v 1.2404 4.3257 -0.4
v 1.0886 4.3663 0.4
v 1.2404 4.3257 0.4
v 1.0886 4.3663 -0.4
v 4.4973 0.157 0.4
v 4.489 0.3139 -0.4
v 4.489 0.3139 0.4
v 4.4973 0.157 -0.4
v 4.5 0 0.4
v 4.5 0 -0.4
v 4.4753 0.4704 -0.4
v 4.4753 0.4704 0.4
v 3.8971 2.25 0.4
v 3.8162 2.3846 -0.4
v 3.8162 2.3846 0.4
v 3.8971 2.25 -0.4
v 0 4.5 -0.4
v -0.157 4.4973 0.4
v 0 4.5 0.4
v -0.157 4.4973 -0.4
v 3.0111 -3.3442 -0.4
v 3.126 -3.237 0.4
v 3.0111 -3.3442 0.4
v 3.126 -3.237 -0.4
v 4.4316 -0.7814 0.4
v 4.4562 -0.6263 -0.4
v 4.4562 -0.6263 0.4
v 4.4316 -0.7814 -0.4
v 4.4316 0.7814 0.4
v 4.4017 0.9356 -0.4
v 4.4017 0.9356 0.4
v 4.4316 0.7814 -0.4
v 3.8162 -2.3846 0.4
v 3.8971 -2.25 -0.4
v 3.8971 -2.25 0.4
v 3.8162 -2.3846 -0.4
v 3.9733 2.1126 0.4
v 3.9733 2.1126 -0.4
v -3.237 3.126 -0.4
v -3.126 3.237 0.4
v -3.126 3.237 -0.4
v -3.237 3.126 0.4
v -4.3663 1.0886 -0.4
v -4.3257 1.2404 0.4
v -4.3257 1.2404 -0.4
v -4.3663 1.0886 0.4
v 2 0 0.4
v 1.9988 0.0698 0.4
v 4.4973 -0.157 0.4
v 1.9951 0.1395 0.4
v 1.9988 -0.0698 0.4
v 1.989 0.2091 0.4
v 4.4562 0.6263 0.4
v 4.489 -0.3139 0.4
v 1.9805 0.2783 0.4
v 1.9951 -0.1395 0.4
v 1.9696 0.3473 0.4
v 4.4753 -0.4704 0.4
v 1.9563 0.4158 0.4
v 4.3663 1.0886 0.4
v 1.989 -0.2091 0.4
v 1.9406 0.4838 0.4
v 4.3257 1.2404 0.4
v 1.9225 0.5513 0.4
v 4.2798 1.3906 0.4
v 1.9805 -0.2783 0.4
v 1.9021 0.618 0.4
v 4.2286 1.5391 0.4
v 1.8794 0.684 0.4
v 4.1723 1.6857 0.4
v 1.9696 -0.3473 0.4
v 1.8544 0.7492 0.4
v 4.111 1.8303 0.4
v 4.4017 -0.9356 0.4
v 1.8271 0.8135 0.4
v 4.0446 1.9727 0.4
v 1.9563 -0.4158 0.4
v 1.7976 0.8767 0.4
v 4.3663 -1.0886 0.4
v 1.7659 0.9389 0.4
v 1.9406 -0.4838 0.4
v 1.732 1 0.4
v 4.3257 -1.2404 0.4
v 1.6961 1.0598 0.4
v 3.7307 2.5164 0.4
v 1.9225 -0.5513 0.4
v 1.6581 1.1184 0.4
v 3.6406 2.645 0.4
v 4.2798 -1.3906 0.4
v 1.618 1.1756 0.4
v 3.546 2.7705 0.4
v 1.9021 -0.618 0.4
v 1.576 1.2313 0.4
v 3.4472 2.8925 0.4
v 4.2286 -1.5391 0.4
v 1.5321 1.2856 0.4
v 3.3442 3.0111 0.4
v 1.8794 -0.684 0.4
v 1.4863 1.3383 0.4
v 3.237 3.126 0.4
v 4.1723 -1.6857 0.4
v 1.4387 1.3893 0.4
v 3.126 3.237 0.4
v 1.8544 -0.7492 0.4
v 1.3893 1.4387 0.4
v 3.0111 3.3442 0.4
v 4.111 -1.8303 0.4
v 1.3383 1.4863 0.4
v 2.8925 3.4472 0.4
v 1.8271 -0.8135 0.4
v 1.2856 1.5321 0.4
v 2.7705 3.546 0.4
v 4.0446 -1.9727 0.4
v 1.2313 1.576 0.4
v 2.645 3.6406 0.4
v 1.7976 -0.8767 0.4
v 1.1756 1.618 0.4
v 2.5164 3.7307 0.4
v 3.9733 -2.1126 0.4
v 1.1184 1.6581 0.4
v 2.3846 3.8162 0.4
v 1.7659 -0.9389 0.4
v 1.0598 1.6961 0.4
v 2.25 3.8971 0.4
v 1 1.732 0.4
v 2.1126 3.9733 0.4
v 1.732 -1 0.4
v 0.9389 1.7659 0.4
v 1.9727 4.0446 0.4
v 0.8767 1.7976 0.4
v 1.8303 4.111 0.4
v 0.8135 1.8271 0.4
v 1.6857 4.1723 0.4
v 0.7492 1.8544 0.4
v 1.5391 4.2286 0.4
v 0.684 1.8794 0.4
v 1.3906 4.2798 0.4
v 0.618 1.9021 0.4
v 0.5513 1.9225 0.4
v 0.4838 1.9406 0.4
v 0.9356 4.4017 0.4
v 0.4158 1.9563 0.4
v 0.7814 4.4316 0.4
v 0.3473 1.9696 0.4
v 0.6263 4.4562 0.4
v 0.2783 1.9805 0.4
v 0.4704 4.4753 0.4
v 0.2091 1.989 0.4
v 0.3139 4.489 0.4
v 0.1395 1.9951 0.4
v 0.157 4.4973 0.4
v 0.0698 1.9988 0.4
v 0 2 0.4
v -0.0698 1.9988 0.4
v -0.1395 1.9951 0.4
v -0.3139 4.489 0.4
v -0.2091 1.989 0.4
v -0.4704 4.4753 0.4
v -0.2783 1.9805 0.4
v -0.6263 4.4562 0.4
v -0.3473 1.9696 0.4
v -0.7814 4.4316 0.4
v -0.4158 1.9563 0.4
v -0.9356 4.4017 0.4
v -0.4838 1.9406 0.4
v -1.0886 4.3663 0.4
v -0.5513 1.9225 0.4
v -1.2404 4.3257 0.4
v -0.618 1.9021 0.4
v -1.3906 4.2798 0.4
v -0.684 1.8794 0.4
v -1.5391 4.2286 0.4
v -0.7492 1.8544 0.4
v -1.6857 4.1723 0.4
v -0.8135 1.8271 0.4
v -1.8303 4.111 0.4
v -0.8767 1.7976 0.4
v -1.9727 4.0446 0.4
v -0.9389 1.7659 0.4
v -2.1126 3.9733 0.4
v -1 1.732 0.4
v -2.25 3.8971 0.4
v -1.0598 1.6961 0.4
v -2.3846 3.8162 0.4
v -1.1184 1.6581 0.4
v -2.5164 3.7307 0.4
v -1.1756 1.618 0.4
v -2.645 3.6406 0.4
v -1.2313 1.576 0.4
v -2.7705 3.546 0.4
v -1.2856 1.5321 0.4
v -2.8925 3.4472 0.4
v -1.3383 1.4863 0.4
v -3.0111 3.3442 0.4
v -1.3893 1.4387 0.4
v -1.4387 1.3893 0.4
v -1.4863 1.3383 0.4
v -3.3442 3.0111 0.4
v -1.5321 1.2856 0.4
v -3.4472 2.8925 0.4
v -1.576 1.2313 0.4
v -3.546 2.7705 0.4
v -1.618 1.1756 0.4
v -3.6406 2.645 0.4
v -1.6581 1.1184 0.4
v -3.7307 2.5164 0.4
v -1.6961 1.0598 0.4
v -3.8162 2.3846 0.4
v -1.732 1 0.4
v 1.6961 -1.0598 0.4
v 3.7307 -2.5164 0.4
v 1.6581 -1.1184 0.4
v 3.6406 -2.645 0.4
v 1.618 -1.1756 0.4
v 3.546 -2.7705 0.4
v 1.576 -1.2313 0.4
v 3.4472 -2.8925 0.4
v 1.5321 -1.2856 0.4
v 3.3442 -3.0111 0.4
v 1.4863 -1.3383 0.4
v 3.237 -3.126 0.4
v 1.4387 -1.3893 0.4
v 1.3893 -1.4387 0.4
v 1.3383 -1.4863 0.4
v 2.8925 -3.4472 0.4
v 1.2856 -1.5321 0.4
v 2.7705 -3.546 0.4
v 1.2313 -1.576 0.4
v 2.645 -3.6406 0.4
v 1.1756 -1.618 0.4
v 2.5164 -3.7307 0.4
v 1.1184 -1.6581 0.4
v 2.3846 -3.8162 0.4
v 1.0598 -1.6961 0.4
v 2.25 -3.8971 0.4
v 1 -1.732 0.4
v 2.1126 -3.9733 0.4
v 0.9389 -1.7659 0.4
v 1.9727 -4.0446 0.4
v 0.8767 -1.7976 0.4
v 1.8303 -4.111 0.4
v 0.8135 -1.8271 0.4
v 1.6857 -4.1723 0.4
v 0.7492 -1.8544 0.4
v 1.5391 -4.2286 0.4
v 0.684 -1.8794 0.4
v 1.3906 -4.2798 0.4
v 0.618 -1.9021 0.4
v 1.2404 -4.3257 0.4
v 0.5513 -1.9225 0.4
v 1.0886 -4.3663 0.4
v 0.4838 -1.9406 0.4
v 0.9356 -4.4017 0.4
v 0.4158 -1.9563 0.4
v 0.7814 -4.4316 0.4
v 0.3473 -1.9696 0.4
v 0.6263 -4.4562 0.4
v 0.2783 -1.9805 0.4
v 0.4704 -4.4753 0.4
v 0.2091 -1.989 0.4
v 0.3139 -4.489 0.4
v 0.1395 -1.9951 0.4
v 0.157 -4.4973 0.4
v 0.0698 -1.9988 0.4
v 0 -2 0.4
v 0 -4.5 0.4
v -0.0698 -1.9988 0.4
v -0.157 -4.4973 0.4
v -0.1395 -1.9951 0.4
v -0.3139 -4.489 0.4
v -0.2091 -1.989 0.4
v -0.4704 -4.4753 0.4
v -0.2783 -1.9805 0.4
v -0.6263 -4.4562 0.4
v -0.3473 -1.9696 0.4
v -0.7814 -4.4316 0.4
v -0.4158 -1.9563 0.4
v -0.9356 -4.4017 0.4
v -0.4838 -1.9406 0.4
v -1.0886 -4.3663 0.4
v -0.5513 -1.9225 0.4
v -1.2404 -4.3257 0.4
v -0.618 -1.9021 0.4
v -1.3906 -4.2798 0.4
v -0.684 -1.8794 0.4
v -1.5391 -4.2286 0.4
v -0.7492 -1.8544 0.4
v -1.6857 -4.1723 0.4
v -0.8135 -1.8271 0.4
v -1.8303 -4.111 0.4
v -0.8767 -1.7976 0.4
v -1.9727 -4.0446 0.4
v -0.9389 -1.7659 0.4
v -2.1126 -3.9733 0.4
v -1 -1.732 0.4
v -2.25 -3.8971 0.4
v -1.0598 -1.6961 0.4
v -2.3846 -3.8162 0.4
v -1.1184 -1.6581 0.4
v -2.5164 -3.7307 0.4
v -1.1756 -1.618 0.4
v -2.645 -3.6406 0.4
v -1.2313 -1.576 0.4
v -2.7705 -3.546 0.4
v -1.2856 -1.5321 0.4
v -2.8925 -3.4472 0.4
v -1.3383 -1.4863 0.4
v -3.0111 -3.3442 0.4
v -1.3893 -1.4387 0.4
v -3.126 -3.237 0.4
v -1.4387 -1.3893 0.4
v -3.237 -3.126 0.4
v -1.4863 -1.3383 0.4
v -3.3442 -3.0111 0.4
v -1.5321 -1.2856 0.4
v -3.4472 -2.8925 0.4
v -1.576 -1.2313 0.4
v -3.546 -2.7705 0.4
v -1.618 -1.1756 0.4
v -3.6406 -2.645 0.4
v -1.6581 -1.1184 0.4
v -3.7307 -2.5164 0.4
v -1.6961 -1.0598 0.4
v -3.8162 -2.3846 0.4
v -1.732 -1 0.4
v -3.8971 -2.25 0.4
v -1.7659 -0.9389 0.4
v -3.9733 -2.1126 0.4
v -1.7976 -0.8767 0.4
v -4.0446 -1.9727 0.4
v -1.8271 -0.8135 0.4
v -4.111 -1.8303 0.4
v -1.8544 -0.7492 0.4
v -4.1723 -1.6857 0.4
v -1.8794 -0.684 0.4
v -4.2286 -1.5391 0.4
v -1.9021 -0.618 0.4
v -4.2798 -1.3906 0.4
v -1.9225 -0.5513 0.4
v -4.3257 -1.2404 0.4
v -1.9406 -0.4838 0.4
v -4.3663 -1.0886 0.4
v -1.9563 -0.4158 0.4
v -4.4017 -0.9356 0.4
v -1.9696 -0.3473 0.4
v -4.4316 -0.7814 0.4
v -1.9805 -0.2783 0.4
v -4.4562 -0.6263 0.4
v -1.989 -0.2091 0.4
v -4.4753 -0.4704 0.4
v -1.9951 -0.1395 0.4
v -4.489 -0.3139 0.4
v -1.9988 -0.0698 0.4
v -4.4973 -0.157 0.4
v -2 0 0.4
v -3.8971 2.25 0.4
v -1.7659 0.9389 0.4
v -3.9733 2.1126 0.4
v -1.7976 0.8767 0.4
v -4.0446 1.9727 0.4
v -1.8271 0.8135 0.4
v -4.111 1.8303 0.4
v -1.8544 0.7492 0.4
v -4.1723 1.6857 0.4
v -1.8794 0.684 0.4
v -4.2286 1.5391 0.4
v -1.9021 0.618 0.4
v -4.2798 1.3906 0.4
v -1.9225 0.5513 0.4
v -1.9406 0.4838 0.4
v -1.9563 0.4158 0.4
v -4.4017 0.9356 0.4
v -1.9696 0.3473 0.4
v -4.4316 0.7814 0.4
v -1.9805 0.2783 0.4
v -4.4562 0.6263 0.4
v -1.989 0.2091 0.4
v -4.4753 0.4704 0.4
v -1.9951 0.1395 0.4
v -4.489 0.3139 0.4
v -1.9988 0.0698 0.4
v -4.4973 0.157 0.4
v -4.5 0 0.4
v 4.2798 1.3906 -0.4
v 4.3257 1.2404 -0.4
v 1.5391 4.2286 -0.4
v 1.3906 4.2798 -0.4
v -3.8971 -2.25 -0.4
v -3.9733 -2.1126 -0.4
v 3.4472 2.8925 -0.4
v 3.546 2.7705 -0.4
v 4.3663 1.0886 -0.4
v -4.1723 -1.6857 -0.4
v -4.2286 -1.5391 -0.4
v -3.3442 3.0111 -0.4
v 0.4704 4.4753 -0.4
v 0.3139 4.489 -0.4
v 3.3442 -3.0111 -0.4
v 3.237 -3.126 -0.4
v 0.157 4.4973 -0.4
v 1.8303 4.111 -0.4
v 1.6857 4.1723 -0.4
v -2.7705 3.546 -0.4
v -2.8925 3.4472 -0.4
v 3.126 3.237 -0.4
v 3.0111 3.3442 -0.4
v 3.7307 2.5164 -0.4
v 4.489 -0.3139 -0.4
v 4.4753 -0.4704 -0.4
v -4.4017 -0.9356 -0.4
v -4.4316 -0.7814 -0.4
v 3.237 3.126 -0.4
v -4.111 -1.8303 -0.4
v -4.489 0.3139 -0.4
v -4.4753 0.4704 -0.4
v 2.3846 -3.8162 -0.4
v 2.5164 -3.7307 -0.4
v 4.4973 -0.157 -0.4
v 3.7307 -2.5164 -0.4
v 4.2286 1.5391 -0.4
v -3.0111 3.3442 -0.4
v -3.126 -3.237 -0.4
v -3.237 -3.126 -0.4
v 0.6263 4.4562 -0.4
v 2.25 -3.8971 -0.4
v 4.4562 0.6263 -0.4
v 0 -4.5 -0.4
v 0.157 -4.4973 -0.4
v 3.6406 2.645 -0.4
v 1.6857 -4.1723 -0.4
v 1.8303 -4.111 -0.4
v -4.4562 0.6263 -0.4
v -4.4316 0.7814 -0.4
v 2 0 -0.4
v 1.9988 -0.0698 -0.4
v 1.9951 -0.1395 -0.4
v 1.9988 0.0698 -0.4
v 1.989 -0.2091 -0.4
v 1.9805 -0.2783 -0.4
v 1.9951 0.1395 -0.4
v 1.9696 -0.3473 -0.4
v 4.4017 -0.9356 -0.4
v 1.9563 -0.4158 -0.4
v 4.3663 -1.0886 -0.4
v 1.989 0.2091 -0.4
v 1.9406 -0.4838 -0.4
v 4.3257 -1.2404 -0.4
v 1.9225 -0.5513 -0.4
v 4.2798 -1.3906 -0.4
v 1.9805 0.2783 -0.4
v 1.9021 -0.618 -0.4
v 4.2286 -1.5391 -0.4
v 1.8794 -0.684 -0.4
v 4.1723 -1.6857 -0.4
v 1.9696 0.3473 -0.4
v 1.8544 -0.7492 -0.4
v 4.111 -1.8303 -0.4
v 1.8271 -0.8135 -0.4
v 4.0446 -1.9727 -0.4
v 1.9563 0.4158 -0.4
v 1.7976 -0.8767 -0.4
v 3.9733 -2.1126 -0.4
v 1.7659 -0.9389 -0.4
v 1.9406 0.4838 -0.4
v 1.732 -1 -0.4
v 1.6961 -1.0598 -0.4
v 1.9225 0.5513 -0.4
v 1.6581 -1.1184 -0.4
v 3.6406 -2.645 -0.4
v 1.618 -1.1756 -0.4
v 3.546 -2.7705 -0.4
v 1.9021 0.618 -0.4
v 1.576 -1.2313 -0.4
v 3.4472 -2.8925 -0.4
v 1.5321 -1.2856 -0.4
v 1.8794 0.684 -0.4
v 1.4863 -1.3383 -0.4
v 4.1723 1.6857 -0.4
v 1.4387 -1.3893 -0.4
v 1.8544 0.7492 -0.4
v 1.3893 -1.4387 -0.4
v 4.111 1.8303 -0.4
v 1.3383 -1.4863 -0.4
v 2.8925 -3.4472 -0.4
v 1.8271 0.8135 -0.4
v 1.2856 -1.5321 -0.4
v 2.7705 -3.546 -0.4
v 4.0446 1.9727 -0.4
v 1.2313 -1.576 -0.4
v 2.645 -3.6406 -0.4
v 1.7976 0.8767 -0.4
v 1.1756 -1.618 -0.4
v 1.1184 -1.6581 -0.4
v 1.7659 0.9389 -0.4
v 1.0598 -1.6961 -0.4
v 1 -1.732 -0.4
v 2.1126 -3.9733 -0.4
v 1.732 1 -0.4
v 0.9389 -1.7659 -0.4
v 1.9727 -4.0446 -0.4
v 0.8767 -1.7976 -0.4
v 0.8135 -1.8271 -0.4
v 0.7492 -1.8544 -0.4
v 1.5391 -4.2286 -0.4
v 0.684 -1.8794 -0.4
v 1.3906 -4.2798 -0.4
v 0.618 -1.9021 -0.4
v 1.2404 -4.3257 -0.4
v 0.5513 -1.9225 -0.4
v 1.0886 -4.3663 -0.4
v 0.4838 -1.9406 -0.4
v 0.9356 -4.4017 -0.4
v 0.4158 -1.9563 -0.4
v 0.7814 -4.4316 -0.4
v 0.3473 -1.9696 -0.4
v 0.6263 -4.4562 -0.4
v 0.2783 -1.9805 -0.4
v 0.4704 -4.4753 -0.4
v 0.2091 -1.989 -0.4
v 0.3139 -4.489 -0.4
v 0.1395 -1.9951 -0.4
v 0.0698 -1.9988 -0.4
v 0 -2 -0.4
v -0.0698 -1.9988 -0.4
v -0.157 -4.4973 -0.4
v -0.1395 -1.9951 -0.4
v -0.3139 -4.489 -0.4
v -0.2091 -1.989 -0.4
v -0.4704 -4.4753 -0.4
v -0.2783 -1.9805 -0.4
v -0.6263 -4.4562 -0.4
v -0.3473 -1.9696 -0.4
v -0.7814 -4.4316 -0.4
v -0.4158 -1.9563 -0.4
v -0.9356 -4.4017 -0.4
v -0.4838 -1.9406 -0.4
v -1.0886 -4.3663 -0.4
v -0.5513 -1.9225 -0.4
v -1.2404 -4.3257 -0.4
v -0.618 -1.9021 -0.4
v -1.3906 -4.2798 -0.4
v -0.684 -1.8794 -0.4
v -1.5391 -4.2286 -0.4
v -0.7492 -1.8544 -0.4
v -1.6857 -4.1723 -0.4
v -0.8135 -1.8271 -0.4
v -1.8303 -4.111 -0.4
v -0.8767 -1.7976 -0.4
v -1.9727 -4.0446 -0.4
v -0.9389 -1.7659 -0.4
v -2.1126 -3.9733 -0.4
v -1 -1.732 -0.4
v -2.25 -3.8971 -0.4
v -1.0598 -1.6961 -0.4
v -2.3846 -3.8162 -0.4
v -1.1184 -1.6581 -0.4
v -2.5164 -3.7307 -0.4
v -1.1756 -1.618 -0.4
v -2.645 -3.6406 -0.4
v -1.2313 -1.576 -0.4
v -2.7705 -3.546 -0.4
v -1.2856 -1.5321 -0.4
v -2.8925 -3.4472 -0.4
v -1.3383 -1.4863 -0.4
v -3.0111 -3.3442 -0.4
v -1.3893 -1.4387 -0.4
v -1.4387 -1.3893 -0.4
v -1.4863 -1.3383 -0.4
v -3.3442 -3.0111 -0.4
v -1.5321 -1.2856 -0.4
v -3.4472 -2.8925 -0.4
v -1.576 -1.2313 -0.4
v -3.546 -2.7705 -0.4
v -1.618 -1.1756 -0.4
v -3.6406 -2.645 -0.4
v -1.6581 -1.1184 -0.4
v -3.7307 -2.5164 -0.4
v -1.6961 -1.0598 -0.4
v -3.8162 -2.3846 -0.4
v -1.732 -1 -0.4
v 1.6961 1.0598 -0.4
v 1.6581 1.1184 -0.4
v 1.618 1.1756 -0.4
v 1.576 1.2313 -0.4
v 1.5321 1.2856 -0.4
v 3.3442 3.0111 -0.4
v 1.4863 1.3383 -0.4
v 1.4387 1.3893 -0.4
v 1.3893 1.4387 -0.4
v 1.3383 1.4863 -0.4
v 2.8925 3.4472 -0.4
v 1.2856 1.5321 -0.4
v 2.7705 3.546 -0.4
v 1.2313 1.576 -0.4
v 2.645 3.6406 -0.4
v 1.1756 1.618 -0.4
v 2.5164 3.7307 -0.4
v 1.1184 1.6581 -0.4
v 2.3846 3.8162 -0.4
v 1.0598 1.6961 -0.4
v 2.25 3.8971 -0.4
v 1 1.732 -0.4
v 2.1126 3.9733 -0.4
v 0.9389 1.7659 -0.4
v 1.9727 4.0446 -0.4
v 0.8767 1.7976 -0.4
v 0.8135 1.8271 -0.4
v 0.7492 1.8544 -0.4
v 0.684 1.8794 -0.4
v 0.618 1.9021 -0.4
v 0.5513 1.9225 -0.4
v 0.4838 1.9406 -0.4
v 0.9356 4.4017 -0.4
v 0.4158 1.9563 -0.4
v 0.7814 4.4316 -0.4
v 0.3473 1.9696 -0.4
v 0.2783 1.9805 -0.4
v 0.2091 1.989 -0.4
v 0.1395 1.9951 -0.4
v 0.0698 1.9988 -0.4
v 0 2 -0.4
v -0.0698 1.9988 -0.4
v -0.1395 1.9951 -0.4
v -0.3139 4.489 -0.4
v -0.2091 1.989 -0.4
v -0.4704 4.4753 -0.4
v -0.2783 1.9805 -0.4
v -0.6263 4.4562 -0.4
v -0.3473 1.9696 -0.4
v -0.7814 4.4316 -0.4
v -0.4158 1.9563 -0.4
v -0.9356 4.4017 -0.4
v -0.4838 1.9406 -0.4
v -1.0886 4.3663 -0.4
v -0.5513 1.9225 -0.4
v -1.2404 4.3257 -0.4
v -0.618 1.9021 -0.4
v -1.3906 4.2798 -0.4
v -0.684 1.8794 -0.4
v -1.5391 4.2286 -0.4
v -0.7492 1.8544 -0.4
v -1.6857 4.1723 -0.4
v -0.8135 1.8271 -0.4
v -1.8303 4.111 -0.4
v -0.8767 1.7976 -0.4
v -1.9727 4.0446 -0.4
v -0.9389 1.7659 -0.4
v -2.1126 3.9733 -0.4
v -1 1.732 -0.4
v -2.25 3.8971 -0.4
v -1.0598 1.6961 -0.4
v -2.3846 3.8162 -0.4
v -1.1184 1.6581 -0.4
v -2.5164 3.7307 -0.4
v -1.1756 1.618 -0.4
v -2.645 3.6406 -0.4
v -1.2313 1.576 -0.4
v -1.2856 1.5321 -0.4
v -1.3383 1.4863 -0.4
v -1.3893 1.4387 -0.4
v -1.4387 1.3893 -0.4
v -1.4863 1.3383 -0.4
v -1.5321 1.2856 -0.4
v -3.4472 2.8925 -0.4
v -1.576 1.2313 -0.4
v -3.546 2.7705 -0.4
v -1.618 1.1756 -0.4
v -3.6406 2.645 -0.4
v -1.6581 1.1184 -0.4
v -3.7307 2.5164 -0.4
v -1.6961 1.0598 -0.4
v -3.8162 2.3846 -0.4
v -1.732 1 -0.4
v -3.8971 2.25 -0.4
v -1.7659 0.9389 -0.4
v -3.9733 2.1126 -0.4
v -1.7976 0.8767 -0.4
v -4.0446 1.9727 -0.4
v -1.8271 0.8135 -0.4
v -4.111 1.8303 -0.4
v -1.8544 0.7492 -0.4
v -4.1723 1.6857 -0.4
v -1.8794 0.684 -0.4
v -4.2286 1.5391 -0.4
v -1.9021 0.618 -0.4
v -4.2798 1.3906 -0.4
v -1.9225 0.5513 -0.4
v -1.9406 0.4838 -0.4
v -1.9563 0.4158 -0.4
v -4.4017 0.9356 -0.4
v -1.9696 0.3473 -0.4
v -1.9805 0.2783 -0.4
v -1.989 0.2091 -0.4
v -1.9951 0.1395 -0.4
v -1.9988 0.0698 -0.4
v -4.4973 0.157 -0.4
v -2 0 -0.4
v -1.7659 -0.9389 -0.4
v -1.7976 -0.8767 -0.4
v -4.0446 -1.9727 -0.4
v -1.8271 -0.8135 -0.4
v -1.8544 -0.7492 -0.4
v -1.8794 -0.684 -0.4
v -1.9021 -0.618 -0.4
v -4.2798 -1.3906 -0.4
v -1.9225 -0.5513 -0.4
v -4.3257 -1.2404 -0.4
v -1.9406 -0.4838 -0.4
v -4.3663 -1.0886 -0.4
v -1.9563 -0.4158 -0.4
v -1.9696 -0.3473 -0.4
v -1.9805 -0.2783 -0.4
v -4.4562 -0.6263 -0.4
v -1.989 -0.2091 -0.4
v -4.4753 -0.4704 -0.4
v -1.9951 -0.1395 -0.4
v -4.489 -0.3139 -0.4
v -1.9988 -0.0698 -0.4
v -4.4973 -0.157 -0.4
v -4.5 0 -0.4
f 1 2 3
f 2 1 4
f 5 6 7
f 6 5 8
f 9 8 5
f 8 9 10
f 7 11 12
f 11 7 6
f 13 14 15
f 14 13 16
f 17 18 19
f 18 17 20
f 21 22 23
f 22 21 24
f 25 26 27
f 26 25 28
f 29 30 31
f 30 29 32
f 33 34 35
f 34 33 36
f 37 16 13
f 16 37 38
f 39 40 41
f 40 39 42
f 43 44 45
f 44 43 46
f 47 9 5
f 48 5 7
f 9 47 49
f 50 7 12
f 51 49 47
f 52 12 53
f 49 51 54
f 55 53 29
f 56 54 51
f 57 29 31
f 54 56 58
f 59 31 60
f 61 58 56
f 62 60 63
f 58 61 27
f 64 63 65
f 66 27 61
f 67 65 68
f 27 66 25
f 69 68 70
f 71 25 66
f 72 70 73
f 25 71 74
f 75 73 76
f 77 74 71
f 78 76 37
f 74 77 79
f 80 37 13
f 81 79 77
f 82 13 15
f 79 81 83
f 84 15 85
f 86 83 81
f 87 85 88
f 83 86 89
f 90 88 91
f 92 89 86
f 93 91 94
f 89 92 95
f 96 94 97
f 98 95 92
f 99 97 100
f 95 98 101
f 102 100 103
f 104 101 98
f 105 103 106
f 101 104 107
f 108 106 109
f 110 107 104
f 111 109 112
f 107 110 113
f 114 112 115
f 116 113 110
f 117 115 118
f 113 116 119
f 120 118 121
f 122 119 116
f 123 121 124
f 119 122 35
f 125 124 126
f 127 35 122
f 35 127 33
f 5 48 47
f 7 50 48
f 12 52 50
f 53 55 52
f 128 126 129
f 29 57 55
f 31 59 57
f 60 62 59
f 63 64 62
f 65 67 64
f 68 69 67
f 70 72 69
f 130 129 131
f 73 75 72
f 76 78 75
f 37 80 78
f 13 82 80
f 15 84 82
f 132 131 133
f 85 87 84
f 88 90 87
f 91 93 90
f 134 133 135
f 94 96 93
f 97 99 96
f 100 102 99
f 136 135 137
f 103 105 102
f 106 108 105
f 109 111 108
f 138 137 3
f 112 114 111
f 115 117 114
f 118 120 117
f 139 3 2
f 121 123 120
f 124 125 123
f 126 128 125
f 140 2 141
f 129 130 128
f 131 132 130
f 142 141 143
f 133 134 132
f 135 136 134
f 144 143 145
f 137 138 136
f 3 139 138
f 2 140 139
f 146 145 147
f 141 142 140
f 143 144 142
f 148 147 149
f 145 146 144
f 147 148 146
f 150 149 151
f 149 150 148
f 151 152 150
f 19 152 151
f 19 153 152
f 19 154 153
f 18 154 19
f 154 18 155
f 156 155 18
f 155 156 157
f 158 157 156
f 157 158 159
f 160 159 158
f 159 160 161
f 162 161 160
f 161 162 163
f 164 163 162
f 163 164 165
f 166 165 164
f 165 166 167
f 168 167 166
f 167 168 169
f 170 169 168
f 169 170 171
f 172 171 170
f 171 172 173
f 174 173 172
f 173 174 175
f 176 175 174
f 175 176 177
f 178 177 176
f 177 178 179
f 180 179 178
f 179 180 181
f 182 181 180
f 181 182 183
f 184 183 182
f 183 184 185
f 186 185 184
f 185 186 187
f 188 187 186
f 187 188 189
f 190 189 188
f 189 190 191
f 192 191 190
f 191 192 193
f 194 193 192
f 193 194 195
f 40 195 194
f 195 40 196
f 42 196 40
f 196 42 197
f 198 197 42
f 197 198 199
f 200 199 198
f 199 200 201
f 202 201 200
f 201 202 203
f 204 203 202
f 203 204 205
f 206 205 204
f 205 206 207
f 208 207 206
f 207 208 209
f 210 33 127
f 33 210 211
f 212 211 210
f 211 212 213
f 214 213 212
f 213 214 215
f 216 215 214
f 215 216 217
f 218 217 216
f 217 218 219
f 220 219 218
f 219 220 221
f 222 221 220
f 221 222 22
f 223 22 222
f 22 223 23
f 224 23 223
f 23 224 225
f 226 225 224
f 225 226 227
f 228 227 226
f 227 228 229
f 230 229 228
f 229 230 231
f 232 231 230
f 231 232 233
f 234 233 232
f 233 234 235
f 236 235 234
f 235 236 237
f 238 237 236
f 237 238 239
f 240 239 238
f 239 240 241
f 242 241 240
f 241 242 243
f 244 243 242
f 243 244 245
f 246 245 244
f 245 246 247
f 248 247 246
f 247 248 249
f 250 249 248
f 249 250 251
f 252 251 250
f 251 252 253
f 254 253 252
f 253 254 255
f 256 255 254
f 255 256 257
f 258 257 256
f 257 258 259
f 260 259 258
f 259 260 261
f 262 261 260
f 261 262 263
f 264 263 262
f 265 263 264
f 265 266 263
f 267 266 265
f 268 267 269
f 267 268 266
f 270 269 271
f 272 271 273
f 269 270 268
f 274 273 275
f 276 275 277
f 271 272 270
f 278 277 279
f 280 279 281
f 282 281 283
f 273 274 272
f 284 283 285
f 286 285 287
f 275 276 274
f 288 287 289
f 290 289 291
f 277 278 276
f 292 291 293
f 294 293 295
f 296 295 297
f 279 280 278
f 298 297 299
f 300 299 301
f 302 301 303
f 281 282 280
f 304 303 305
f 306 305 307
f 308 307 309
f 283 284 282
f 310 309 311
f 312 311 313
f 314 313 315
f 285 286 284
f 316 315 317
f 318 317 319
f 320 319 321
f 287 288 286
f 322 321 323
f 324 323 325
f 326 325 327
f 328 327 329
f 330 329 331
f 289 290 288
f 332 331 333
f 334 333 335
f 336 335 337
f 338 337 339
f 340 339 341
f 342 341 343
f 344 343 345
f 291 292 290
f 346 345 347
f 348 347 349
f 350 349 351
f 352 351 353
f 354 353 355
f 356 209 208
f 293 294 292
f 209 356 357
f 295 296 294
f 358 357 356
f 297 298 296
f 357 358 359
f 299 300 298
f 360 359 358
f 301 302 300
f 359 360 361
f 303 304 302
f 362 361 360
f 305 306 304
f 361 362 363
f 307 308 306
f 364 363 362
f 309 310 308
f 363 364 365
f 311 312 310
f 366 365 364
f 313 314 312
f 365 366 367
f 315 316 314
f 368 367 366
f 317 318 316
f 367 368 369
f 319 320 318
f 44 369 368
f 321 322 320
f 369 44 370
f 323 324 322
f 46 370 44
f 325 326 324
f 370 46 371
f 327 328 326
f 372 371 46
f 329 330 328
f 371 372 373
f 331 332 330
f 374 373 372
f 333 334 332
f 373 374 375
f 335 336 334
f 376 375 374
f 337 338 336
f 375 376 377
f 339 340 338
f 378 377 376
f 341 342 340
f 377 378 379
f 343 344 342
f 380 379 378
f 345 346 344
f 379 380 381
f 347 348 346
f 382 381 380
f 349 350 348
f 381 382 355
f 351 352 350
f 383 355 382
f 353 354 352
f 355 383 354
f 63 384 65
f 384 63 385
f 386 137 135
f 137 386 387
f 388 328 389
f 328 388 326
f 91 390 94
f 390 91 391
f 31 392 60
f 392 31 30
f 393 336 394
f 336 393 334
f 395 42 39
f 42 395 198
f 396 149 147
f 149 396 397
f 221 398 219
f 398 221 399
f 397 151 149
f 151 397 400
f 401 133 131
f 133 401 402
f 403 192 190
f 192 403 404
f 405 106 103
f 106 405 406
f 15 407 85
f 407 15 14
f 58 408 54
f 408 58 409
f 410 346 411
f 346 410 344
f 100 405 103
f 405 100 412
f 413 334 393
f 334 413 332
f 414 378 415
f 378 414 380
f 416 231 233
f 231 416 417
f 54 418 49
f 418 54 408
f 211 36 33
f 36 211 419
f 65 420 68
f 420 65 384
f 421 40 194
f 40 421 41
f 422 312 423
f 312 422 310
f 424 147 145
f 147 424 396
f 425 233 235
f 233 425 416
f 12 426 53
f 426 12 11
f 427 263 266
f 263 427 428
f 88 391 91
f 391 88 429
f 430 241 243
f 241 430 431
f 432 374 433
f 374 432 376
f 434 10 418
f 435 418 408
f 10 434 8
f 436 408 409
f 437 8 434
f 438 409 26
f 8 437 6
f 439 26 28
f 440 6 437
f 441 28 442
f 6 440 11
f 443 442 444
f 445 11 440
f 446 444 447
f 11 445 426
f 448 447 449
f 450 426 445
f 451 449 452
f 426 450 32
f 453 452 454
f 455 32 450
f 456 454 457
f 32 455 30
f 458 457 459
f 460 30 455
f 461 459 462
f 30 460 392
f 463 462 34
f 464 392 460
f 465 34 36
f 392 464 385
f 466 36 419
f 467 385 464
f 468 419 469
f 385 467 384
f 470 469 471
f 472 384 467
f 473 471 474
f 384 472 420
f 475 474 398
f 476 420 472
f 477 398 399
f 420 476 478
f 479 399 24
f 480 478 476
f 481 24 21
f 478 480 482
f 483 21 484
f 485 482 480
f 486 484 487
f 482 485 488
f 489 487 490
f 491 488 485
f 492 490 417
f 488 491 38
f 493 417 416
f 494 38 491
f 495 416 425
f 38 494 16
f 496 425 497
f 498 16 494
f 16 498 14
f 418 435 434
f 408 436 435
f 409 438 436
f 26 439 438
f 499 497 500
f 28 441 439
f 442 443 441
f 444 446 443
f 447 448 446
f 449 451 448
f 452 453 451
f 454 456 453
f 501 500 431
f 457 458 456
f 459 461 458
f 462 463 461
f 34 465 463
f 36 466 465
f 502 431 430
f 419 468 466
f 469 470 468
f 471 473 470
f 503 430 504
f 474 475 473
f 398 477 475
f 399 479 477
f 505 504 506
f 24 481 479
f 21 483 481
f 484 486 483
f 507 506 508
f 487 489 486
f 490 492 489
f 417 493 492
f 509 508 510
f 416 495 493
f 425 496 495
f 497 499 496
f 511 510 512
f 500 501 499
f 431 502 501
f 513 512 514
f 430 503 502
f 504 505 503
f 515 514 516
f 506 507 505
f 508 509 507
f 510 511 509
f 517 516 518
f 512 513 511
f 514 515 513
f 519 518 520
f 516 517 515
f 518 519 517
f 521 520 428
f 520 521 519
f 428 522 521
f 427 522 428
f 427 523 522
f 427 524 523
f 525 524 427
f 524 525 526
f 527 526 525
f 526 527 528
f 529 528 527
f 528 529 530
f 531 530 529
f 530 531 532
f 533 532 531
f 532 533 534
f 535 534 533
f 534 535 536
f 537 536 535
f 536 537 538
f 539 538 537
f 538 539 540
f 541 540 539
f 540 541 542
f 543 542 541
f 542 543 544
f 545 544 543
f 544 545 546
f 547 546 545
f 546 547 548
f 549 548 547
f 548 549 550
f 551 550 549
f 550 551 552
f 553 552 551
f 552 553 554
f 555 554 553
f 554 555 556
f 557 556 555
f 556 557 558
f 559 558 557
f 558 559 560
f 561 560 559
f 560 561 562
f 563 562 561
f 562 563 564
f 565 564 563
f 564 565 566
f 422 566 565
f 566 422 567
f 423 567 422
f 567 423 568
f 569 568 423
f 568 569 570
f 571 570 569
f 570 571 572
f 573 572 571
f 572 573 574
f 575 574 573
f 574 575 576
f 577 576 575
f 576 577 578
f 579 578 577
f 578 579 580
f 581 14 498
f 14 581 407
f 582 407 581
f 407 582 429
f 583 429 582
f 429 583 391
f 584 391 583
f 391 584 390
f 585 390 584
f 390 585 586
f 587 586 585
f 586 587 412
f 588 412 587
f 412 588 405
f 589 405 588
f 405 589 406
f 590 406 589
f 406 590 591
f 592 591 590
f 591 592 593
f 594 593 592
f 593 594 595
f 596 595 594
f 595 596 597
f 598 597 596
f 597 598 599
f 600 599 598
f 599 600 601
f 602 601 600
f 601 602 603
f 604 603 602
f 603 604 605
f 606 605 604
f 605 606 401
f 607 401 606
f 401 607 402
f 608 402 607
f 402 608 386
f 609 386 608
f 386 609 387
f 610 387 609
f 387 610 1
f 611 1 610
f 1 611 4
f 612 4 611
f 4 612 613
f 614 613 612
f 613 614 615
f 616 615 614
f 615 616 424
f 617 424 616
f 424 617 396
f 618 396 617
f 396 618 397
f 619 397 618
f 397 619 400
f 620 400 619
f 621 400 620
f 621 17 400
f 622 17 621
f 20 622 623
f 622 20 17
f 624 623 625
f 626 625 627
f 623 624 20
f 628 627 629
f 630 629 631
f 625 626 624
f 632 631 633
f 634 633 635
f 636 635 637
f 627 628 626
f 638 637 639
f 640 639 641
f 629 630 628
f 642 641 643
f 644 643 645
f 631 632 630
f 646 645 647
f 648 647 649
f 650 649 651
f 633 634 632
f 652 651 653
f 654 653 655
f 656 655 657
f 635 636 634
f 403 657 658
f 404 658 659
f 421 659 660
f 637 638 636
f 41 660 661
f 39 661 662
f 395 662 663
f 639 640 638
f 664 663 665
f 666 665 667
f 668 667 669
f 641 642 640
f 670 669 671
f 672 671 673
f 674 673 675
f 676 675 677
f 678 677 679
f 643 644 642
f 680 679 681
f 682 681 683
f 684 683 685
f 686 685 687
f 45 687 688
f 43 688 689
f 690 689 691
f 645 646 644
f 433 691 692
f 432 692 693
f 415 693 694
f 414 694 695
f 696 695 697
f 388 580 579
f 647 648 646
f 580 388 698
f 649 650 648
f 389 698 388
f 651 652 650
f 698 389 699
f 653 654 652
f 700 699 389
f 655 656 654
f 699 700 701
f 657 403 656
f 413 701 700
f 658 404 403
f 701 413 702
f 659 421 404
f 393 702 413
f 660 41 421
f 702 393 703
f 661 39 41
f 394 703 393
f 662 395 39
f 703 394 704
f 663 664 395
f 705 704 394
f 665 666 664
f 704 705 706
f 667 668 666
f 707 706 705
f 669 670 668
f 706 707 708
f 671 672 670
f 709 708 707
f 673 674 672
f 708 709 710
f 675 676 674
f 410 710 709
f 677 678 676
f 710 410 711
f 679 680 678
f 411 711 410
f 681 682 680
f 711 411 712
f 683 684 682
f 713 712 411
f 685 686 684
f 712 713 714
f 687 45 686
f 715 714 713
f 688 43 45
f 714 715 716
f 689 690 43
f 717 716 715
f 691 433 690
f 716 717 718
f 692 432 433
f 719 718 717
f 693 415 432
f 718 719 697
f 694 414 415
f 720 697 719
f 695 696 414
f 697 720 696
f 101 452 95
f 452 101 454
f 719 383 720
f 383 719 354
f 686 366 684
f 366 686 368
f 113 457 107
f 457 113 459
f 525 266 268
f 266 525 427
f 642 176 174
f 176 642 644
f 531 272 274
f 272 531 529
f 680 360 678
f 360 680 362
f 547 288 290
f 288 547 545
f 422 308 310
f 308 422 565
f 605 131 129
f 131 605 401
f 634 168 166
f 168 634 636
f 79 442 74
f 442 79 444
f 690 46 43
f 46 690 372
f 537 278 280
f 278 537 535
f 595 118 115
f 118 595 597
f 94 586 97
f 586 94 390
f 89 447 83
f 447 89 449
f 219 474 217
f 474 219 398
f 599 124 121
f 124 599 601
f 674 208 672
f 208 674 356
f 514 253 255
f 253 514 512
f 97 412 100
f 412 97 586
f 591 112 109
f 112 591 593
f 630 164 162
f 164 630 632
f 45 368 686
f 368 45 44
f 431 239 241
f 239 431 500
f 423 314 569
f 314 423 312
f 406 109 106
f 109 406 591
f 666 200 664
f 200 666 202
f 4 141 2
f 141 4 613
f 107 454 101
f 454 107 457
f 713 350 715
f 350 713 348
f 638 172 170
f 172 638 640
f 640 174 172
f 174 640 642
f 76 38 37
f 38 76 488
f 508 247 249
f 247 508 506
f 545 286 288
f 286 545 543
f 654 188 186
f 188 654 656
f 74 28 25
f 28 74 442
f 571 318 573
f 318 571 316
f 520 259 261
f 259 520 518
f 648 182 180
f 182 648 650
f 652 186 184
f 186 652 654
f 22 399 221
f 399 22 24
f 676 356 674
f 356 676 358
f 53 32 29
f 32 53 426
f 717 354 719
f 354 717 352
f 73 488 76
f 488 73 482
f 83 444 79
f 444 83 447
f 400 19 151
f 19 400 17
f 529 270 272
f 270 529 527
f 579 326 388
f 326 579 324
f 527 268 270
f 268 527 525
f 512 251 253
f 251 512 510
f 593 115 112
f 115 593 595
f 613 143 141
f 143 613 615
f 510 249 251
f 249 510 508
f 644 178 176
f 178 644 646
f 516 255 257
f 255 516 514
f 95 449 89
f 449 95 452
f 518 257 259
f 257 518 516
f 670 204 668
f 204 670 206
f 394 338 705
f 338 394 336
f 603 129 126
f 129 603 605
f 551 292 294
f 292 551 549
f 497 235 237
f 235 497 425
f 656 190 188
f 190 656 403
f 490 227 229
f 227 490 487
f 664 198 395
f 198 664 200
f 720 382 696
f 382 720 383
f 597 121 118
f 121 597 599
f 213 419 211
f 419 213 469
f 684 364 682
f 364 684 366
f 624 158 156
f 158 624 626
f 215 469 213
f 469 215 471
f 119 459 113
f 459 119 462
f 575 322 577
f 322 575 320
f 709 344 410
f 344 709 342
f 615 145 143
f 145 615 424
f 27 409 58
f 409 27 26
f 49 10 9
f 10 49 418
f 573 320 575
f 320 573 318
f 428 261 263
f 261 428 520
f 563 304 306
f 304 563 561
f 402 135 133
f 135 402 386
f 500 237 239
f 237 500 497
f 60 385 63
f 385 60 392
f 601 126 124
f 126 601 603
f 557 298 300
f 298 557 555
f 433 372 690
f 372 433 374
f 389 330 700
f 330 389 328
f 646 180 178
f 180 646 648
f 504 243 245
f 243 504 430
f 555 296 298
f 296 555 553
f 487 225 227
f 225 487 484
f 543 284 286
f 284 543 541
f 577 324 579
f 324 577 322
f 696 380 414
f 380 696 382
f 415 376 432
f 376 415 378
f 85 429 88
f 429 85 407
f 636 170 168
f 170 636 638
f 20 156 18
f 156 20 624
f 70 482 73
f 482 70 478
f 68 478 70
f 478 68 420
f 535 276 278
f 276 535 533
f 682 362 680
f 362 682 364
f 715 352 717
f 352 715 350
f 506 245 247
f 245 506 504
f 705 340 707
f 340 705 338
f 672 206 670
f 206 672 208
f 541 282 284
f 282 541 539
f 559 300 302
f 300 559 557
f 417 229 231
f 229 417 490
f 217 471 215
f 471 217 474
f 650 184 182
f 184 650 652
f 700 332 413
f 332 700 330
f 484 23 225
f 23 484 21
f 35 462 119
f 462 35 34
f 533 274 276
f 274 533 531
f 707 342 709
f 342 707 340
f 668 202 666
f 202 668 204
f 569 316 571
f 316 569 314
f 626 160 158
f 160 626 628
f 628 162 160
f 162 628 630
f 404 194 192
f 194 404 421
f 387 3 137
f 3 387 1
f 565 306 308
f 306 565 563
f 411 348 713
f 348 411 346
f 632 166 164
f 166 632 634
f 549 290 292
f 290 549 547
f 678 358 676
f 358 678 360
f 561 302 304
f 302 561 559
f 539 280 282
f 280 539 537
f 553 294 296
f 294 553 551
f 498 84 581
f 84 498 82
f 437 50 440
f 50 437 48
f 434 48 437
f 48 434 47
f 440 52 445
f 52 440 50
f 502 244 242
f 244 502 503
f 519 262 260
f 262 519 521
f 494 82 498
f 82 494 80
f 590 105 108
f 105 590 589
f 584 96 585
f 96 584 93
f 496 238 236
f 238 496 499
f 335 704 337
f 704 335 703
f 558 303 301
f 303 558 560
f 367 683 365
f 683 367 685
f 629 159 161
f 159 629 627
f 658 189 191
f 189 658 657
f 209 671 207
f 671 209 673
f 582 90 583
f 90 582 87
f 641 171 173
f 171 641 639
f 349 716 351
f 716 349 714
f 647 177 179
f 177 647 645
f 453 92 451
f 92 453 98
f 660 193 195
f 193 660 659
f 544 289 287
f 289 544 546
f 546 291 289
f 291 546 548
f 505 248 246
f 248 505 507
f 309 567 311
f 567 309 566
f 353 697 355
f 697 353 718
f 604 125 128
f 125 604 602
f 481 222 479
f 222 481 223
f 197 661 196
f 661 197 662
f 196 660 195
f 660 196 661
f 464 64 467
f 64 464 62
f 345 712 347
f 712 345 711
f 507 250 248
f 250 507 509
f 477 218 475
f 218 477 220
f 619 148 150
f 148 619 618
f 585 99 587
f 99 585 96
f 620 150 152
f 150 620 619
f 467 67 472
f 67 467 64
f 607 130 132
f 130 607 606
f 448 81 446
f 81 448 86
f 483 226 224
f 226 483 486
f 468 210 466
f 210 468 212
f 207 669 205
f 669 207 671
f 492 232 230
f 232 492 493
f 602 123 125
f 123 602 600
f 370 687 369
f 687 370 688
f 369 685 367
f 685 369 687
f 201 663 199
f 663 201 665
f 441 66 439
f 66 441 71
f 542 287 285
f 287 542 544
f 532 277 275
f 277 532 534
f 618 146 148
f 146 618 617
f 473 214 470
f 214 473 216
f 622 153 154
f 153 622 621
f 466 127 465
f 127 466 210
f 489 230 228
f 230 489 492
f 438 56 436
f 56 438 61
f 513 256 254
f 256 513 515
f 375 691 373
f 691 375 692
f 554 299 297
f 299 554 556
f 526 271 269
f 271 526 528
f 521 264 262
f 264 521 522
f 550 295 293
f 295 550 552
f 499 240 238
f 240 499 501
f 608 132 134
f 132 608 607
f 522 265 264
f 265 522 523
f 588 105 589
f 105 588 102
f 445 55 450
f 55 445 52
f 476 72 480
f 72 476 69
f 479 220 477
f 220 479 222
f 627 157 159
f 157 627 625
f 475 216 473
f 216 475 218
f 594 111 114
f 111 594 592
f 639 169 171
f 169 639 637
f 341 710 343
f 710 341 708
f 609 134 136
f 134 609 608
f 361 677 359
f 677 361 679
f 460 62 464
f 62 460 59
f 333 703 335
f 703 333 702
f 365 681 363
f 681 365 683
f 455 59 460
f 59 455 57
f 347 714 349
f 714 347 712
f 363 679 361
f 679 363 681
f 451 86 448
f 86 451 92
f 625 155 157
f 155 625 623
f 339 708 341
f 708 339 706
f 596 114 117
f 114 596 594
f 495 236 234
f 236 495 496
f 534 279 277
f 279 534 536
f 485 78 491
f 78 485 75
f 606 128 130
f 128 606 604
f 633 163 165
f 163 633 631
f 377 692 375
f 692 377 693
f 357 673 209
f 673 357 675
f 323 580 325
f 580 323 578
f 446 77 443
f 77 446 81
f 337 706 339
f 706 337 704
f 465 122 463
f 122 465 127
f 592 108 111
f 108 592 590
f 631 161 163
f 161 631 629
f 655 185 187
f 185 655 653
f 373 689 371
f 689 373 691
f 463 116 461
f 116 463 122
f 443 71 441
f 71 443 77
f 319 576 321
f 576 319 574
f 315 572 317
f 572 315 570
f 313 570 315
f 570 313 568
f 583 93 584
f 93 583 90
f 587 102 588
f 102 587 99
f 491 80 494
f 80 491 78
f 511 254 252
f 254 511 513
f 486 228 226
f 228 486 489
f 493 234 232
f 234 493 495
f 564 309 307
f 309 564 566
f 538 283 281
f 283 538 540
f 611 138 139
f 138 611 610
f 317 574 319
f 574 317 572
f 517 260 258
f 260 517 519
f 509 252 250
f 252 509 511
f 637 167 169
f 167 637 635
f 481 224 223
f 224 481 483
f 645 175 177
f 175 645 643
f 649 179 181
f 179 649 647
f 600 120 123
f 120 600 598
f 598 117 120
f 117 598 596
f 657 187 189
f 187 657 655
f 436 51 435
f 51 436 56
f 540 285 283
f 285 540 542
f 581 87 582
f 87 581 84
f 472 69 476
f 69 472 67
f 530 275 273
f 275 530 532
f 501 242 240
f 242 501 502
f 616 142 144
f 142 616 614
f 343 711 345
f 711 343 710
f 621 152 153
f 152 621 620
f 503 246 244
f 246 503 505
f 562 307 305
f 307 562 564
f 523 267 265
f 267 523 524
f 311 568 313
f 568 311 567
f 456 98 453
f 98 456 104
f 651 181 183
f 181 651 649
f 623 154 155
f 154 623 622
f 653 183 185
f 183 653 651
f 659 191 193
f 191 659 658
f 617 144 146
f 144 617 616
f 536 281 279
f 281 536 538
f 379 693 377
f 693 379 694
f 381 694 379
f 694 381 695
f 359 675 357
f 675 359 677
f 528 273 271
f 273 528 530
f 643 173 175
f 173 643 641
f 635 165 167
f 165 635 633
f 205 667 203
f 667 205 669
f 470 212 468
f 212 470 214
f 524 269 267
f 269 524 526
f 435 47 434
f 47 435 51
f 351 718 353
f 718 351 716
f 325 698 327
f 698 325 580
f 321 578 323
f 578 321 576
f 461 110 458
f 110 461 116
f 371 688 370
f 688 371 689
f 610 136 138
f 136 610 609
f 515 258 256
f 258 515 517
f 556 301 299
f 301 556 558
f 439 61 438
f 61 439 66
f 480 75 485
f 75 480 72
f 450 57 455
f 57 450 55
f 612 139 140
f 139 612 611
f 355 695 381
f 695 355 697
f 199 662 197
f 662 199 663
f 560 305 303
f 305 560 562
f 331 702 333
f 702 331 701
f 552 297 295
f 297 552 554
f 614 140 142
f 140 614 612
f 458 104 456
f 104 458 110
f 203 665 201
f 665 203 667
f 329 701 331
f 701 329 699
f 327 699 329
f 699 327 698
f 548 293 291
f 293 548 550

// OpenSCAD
$fn = 180;

id = 4.0;        // inner diameter (mm)
od = 9.0;        // outer diameter (mm)
th = 0.8;        // thickness (mm)
eps = 0.02;      // small overlap to ensure clean boolean

difference() {
    cylinder(h = th, d = od, center = true);
    cylinder(h = th + 2*eps, d = id, center = true);
}
